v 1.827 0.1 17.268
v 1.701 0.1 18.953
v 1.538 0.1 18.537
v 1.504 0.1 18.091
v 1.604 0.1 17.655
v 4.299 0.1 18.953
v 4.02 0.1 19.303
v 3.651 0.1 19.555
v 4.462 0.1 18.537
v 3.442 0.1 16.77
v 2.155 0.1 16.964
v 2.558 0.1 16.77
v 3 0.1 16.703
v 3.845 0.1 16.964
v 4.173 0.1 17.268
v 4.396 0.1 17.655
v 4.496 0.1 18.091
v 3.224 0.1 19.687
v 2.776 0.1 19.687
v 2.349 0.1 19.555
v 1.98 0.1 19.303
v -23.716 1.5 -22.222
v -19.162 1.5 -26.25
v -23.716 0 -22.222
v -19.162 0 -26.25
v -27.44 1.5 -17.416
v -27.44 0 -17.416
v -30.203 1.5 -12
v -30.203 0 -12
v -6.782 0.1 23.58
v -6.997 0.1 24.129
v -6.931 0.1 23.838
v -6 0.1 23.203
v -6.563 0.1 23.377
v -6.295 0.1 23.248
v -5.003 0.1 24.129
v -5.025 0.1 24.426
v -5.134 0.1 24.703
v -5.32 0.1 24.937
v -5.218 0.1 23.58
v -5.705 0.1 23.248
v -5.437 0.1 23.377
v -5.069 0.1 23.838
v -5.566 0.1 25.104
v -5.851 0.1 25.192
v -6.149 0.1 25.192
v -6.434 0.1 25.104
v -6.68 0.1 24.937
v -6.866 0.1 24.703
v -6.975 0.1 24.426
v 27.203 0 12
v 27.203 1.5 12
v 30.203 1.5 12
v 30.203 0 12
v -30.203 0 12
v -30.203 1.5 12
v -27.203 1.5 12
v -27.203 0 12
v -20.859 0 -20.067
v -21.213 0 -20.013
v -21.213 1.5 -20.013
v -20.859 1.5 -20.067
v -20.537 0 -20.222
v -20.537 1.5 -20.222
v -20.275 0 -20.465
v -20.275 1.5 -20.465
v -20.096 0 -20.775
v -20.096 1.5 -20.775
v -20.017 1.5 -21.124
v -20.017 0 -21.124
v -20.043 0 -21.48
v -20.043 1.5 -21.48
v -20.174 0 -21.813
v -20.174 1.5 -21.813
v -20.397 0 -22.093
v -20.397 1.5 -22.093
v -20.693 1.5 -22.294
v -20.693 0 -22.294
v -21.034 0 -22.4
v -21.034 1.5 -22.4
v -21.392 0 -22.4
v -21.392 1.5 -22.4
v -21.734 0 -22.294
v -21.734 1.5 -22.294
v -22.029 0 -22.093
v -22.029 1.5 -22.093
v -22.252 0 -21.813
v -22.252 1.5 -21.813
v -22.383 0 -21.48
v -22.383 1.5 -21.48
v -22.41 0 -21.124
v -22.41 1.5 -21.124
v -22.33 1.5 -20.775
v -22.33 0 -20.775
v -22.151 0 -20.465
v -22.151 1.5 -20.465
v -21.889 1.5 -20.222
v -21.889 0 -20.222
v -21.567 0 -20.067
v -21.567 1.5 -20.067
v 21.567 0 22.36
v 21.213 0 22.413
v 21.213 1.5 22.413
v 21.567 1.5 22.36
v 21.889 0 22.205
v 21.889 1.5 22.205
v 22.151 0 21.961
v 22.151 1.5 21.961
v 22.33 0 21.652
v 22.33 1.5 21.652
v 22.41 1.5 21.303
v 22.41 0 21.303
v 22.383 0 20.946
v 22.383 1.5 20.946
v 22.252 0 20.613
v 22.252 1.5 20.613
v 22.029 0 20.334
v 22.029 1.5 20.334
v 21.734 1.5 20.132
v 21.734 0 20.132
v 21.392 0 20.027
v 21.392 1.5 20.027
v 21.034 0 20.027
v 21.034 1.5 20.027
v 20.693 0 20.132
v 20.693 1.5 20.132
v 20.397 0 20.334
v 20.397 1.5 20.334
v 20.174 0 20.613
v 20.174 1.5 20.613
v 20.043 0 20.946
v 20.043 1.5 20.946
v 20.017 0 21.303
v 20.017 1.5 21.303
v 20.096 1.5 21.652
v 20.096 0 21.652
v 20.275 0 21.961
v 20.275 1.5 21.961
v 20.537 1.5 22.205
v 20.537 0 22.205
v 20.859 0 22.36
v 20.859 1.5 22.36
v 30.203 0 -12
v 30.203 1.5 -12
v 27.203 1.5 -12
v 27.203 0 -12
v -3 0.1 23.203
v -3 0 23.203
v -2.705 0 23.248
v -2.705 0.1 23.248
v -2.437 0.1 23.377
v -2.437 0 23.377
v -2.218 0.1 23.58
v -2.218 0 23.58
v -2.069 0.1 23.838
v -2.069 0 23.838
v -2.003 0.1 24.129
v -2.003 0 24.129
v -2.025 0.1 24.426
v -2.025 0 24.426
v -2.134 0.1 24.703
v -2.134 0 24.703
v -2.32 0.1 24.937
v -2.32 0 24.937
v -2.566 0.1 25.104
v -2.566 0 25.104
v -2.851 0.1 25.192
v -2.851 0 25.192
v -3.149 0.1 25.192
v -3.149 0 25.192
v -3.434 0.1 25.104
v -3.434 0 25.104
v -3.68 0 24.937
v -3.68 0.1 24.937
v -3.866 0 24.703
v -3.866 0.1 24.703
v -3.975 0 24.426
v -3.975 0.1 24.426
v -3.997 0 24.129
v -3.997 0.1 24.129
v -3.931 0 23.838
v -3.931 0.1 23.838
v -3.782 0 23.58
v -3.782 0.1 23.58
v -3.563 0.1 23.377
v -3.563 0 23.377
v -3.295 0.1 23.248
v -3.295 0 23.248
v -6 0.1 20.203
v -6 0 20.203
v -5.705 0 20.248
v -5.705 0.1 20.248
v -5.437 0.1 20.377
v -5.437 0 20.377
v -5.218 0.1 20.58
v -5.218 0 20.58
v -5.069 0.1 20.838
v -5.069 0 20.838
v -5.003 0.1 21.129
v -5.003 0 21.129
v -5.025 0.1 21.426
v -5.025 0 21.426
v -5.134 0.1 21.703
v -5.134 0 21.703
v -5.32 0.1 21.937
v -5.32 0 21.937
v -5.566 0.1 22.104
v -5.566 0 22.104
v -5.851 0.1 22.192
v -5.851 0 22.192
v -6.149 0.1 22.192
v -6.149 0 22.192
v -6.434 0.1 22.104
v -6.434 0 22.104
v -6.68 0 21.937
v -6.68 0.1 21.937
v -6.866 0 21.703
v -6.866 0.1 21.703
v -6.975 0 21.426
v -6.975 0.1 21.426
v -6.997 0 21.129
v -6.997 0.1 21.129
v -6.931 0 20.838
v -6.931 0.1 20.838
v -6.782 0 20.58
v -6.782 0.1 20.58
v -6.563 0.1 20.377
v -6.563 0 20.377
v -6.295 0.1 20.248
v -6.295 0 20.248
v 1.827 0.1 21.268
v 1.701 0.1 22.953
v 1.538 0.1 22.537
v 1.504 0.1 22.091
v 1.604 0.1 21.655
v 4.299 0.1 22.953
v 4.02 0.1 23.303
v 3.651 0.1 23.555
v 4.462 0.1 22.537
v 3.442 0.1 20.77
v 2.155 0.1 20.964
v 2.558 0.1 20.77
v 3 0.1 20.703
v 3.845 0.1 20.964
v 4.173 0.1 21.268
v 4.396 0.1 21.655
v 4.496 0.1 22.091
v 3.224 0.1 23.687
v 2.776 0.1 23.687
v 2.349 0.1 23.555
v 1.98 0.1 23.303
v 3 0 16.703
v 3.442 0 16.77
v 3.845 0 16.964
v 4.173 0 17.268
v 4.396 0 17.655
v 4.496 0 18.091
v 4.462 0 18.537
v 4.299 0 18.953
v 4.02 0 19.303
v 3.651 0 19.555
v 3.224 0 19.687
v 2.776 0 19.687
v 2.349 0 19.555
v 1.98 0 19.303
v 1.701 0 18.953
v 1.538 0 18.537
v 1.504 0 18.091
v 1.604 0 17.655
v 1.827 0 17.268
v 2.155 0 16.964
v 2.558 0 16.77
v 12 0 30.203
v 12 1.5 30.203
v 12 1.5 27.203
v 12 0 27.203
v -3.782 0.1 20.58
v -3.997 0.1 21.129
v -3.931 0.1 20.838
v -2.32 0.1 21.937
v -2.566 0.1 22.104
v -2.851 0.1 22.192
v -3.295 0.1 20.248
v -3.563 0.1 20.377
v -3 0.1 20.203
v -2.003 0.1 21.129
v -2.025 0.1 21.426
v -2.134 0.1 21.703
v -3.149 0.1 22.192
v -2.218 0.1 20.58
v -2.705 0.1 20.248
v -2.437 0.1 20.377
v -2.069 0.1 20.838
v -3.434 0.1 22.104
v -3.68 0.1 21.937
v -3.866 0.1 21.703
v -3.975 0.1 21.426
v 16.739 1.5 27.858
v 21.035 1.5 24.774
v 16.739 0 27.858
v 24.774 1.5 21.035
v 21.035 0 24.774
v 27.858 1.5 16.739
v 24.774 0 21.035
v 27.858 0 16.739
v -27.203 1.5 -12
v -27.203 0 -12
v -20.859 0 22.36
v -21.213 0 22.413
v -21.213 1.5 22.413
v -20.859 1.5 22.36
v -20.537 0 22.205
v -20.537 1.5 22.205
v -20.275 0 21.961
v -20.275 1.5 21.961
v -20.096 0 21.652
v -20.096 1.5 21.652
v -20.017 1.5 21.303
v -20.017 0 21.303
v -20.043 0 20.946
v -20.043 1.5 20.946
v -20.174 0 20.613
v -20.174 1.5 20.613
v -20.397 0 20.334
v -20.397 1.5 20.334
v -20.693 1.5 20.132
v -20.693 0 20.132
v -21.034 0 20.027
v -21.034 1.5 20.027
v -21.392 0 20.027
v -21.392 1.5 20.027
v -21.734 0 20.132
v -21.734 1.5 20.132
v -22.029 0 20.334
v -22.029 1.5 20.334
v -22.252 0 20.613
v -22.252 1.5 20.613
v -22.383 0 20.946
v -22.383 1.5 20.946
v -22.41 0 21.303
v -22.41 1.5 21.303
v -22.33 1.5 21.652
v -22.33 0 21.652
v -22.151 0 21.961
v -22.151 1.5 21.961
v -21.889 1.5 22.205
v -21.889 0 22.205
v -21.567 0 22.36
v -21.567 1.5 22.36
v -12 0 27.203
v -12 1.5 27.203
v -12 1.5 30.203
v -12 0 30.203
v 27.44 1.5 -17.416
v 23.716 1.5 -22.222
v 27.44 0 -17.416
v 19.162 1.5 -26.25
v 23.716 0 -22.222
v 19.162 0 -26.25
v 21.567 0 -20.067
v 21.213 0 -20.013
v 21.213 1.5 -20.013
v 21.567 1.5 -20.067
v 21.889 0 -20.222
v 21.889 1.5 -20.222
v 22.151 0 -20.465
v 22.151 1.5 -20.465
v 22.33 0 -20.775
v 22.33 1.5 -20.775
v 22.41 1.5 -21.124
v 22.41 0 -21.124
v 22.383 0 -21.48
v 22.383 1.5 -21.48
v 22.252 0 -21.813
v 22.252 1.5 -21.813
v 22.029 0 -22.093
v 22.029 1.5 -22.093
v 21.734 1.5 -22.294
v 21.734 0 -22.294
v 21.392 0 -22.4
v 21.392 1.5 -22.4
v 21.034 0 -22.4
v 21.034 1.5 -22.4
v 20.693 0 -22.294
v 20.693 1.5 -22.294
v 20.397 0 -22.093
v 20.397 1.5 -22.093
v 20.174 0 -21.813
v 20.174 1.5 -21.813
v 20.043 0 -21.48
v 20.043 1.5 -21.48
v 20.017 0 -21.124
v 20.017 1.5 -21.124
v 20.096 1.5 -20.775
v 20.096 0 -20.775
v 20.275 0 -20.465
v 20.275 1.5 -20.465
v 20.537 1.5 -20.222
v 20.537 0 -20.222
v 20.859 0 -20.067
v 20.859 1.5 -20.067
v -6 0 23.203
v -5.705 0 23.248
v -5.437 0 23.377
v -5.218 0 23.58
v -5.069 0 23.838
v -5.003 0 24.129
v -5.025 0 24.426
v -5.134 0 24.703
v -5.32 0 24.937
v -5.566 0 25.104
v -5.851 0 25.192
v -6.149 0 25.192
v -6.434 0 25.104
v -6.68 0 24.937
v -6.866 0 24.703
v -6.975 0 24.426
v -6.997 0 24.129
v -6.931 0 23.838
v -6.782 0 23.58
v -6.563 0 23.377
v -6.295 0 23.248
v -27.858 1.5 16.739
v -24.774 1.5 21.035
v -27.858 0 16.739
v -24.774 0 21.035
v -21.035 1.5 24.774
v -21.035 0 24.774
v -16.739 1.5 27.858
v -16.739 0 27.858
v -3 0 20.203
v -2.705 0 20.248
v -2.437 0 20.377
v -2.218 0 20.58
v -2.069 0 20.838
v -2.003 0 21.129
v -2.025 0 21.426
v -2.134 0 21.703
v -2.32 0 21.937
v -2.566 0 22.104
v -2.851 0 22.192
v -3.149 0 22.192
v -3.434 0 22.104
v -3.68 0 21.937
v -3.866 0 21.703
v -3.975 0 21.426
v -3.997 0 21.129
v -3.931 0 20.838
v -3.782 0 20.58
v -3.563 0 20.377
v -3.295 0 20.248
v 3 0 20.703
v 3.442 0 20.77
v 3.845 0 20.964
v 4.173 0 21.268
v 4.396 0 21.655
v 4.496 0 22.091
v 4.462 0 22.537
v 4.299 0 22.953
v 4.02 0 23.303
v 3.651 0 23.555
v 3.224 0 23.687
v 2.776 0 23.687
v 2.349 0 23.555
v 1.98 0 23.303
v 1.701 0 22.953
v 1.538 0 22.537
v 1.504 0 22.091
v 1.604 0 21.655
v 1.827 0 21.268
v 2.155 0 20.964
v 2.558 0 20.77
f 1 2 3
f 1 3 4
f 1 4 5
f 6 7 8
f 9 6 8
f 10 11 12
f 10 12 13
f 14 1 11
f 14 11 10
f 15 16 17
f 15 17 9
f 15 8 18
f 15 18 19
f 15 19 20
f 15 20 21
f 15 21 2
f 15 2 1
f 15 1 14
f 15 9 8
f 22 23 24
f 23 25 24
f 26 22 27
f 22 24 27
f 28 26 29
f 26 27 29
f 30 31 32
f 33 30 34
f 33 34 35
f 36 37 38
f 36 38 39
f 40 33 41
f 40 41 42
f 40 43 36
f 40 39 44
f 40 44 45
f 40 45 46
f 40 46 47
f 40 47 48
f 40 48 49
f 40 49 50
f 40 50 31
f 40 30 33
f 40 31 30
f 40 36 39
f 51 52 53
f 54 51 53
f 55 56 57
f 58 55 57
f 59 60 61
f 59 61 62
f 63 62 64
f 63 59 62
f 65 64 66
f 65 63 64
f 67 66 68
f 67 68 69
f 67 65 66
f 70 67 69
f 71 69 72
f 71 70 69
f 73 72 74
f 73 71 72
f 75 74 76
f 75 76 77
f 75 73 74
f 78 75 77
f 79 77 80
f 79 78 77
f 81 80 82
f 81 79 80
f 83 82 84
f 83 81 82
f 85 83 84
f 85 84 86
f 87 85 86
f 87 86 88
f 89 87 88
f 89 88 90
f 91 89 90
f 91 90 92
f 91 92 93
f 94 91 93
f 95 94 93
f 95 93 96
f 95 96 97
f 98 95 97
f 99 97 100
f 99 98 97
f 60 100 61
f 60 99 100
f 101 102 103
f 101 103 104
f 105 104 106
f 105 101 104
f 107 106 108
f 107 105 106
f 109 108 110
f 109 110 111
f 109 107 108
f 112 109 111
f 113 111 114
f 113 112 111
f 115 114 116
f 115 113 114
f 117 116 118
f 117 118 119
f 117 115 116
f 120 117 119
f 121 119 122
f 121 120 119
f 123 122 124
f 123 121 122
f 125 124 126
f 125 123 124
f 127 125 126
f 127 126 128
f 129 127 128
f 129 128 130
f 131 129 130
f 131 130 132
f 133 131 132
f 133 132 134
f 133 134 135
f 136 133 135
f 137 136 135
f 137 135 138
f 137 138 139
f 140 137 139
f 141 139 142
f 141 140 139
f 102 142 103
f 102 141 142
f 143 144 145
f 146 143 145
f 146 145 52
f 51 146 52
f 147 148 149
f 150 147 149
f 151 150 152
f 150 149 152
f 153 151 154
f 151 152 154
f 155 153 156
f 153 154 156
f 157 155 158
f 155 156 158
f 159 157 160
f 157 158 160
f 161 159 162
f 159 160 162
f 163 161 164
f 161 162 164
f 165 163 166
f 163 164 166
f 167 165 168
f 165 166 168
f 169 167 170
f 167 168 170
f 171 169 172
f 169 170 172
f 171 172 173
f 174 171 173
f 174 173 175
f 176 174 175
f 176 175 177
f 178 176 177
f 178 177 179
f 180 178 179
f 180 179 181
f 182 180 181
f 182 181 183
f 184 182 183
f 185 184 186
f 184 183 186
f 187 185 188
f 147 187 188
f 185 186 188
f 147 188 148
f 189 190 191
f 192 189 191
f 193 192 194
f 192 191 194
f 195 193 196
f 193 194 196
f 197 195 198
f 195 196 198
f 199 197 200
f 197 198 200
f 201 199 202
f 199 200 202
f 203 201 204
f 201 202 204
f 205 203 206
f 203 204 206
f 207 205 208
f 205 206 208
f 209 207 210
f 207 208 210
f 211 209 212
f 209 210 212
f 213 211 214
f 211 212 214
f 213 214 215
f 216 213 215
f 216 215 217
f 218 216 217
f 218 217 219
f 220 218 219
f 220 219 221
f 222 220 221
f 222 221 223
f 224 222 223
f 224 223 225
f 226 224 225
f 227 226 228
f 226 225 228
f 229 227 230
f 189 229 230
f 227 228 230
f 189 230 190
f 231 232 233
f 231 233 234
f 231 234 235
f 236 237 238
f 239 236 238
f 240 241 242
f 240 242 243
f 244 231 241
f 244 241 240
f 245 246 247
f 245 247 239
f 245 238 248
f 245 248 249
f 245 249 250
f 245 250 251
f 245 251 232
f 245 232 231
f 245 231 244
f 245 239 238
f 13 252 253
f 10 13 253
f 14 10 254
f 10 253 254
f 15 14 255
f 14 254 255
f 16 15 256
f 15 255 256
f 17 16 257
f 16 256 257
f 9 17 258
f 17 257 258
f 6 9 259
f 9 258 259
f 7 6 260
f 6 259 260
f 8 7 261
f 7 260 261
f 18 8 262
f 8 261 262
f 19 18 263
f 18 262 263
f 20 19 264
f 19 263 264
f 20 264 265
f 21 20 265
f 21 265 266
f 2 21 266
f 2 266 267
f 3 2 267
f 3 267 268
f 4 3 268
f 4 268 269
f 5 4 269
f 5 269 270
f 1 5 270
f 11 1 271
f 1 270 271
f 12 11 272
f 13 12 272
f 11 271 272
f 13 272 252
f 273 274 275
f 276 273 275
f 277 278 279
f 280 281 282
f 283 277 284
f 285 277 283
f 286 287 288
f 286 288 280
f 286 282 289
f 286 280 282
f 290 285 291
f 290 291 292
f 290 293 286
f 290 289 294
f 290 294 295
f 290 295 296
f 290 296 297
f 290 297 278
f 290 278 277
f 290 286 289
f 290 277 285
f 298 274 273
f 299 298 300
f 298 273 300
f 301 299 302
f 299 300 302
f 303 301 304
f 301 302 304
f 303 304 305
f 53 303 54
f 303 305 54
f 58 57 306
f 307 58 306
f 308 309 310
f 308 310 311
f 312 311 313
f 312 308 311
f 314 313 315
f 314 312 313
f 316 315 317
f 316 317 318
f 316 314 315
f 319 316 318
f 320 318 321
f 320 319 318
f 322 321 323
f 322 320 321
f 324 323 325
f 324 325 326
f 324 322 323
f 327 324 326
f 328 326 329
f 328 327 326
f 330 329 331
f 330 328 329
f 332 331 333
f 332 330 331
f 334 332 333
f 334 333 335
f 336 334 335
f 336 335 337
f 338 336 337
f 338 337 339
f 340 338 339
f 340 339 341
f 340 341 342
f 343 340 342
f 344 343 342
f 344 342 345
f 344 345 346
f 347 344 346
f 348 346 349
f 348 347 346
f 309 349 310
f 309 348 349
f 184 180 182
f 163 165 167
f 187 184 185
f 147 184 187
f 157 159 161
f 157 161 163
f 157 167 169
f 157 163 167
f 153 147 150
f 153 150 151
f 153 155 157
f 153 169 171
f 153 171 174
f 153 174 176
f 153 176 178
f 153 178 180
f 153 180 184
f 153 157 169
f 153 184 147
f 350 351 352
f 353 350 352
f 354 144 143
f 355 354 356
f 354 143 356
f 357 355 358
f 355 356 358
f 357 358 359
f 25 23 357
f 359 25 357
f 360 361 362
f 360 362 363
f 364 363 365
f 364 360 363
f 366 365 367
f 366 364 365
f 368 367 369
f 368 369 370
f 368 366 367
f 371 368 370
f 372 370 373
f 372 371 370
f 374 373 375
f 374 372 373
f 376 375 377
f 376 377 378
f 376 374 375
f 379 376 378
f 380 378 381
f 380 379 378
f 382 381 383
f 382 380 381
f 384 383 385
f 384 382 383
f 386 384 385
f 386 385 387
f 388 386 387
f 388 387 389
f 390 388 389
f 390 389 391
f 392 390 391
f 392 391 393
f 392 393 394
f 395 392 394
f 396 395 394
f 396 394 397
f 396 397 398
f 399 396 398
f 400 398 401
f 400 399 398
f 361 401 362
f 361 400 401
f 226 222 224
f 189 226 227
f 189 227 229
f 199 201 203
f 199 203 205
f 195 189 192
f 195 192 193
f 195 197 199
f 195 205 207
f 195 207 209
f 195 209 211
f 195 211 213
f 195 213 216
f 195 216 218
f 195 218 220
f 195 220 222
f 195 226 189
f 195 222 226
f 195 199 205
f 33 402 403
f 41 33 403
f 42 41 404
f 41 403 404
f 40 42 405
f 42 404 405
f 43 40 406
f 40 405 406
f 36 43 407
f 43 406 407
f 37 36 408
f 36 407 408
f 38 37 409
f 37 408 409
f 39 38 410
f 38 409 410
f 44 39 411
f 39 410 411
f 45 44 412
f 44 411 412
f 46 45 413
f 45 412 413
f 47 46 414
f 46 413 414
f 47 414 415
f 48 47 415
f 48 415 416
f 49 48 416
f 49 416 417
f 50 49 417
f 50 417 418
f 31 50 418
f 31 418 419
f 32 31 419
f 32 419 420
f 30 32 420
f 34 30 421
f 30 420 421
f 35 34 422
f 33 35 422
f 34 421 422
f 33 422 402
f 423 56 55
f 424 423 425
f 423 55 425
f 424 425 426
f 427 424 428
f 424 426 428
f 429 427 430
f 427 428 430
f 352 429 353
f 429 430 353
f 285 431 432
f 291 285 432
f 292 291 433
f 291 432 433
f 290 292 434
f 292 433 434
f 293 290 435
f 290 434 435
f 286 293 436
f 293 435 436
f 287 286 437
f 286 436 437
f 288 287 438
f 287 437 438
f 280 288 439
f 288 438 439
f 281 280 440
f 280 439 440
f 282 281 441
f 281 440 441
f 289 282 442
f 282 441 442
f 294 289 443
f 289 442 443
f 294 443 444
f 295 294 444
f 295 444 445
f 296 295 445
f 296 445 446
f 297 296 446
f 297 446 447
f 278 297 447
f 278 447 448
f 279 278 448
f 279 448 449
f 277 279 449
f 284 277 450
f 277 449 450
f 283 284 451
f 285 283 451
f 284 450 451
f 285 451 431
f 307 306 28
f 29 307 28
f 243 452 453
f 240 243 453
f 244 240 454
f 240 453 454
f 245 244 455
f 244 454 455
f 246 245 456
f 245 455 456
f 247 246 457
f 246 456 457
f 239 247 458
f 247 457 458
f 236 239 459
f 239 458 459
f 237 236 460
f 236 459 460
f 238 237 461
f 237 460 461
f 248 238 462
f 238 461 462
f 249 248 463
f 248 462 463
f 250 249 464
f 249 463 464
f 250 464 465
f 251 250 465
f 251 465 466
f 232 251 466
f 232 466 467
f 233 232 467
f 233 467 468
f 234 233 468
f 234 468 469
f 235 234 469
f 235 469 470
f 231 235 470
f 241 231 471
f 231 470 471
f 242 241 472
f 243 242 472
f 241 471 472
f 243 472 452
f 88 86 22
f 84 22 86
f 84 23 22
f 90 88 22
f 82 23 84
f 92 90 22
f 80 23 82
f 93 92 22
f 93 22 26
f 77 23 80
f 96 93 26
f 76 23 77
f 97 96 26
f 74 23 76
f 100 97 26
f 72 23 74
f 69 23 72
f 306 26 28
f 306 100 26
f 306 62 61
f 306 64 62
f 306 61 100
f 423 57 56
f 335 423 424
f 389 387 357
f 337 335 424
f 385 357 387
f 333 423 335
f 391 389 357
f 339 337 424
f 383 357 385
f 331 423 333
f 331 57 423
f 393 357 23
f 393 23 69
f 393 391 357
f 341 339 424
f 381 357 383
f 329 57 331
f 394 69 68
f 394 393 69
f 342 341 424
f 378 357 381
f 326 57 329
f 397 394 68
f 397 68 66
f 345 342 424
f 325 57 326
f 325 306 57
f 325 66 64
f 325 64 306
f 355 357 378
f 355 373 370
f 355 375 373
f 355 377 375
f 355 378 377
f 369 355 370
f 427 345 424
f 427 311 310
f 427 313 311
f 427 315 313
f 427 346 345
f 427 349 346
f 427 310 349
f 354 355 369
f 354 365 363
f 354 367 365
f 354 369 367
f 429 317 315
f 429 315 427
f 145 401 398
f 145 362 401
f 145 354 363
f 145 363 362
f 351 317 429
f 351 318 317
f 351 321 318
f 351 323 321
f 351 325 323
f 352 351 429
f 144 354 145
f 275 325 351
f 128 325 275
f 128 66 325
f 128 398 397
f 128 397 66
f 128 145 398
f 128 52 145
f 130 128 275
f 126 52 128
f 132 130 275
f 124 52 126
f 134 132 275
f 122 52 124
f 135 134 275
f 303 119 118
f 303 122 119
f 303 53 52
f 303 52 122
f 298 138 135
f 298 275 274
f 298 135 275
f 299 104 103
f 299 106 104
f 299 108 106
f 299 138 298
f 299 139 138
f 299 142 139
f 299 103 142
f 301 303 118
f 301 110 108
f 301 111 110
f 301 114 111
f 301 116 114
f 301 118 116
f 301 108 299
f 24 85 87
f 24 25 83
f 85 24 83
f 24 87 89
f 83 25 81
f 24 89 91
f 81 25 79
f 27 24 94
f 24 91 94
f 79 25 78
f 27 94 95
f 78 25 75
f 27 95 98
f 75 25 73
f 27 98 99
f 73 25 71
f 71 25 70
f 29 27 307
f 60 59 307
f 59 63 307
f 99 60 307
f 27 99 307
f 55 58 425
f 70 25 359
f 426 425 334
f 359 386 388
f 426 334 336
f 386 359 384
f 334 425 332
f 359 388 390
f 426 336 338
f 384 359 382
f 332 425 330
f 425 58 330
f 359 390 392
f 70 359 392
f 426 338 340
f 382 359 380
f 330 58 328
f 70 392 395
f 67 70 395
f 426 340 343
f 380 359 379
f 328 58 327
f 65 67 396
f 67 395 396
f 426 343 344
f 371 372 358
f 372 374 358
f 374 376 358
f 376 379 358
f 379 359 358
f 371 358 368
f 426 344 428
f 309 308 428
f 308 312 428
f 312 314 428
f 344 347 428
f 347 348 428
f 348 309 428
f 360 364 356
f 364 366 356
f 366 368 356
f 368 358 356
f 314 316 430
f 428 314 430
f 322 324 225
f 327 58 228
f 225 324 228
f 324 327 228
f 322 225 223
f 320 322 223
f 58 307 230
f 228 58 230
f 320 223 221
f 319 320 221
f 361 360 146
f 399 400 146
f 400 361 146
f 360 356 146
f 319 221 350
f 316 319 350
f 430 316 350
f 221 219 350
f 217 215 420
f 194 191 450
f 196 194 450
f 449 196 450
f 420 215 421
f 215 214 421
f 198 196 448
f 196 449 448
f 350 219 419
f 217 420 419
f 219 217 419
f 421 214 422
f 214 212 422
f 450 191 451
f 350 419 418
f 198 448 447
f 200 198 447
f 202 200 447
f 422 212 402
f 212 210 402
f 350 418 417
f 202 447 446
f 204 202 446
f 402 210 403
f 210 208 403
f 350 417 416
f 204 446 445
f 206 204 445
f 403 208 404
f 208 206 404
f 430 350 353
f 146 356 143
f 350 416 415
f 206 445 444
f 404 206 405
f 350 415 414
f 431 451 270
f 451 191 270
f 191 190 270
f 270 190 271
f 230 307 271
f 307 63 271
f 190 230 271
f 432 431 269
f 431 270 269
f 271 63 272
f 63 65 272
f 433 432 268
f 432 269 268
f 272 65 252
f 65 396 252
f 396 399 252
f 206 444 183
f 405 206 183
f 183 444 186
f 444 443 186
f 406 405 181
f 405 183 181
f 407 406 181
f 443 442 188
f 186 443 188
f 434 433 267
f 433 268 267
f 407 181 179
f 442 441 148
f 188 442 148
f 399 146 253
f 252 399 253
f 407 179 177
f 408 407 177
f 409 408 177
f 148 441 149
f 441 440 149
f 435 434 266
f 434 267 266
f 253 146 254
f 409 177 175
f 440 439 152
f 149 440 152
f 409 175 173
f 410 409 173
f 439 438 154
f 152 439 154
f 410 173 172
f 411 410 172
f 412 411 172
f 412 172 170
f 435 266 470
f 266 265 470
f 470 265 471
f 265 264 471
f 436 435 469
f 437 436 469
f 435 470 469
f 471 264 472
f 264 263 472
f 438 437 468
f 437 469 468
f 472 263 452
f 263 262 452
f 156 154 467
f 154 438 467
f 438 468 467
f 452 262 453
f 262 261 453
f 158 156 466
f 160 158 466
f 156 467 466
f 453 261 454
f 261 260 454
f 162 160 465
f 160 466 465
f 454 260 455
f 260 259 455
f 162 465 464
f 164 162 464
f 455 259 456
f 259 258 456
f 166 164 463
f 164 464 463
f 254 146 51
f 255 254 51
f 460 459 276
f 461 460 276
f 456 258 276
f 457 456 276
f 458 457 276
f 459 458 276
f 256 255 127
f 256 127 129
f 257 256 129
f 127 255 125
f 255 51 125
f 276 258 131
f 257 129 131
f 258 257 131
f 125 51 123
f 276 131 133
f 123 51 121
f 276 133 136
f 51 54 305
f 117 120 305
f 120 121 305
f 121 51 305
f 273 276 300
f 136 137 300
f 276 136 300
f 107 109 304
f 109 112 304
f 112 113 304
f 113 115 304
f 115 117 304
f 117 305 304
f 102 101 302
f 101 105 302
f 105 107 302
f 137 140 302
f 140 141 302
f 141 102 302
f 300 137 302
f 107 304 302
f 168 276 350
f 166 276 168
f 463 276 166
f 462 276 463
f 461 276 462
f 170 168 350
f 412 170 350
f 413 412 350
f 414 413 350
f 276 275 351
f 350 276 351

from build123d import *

# Parameters (mm, degrees)
SKETCH_1_R          = 32.5
SKETCH_1_R_2        = 1.2
EXTRUDE_1_DEPTH     = 1.5
CUT_EXTRUDE_1_DEPTH = 46.986411036
CUT_EXTRUDE_2_DEPTH = 43.74049602
SKETCH_4_R          = 1.5
SKETCH_4_R_2        = 1
CUT_EXTRUDE_3_DEPTH = 0.1


with BuildPart() as part:
    # 草图1 → 凸台-拉伸1 (new body)
    with BuildSketch(Plane(origin=(0, 0, 0), x_dir=(1, 0, 0), z_dir=(0, 1, 0))):
        with Locations(Location((0, 0, 0), (0, 0, 270))):
            Circle(SKETCH_1_R)
        with Locations(Location((21.213203436, 21.213203436, 0), (0, 0, 270))):
            Circle(SKETCH_1_R_2, mode=Mode.SUBTRACT)
        with Locations(Location((21.213203436, -21.213203436, 0), (0, 0, 270))):
            Circle(SKETCH_1_R_2, mode=Mode.SUBTRACT)
        with Locations(Location((-21.213203436, -21.213203436, 0), (0, 0, 270))):
            Circle(SKETCH_1_R_2, mode=Mode.SUBTRACT)
        with Locations(Location((-21.213203436, 21.213203436, 0), (0, 0, 270))):
            Circle(SKETCH_1_R_2, mode=Mode.SUBTRACT)
    extrude(amount=EXTRUDE_1_DEPTH)

    # 草图2 → 切除-拉伸1 (cut, through all)
    with BuildSketch(Plane(origin=(0, 1.5, 0), x_dir=(1, 0, 0), z_dir=(0, 1, 0))):
        with BuildLine():
            Line((30.203476621, 12), (27.203476621, 12))
            Line((27.203476621, 12), (27.203476621, -12))
            Line((27.203476621, -12), (30.203476621, -12))
            ThreePointArc((30.203476621, -12), (32.5, 0), (30.203476621, 12))
        make_face()
        with BuildLine():
            Line((12, -27.203476621), (-12, -27.203476621))
            Line((-12, -27.203476621), (-12, -30.203476621))
            ThreePointArc((-12, -30.203476621), (0, -32.5), (12, -30.203476621))
            Line((12, -30.203476621), (12, -27.203476621))
        make_face()
        with BuildLine():
            Line((-27.203476621, -12), (-27.203476621, 12))
            Line((-27.203476621, 12), (-30.203476621, 12))
            ThreePointArc((-30.203476621, 12), (-32.5, 0), (-30.203476621, -12))
            Line((-30.203476621, -12), (-27.203476621, -12))
        make_face()
        with BuildLine():
            Line((-12, 27.203476621), (12, 27.203476621))
            Line((12, 27.203476621), (12, 30.203476621))
            ThreePointArc((12, 30.203476621), (0, 32.5), (-12, 30.203476621))
            Line((-12, 30.203476621), (-12, 27.203476621))
        make_face()
    extrude(amount=-CUT_EXTRUDE_1_DEPTH, mode=Mode.SUBTRACT)

    # 草图3 → 切除-拉伸2 (cut, through all)
    with BuildSketch(Plane(origin=(0, 1.5, 0), x_dir=(1, 0, 0), z_dir=(0, 1, 0))):
        Polygon((17, 26.25), (-17, 26.25), (-27.149655647, 26.25), (-14.240374978, 46.745445694), (28.149411973, 26.25), align=None)
    extrude(amount=-CUT_EXTRUDE_2_DEPTH, mode=Mode.SUBTRACT)

    # 草图4 → 切除-拉伸3 (cut)
    with BuildSketch(Plane.XZ):
        with Locations(Location((3, 22.203476621, 0), (0, 0, 270))):
            Circle(SKETCH_4_R)
        with Locations(Location((3, 18.203476621, 0), (0, 0, 270))):
            Circle(SKETCH_4_R)
        with Locations(Location((-6, 24.203476621, 0), (0, 0, 270))):
            Circle(SKETCH_4_R_2)
        with Locations(Location((-3, 24.203476621, 0), (0, 0, 270))):
            Circle(SKETCH_4_R_2)
        with Locations(Location((-3, 21.203476621, 0), (0, 0, 270))):
            Circle(SKETCH_4_R_2)
        with Locations(Location((-6, 21.203476621, 0), (0, 0, 270))):
            Circle(SKETCH_4_R_2)
    extrude(amount=-CUT_EXTRUDE_3_DEPTH, mode=Mode.SUBTRACT)


solid = part.part
